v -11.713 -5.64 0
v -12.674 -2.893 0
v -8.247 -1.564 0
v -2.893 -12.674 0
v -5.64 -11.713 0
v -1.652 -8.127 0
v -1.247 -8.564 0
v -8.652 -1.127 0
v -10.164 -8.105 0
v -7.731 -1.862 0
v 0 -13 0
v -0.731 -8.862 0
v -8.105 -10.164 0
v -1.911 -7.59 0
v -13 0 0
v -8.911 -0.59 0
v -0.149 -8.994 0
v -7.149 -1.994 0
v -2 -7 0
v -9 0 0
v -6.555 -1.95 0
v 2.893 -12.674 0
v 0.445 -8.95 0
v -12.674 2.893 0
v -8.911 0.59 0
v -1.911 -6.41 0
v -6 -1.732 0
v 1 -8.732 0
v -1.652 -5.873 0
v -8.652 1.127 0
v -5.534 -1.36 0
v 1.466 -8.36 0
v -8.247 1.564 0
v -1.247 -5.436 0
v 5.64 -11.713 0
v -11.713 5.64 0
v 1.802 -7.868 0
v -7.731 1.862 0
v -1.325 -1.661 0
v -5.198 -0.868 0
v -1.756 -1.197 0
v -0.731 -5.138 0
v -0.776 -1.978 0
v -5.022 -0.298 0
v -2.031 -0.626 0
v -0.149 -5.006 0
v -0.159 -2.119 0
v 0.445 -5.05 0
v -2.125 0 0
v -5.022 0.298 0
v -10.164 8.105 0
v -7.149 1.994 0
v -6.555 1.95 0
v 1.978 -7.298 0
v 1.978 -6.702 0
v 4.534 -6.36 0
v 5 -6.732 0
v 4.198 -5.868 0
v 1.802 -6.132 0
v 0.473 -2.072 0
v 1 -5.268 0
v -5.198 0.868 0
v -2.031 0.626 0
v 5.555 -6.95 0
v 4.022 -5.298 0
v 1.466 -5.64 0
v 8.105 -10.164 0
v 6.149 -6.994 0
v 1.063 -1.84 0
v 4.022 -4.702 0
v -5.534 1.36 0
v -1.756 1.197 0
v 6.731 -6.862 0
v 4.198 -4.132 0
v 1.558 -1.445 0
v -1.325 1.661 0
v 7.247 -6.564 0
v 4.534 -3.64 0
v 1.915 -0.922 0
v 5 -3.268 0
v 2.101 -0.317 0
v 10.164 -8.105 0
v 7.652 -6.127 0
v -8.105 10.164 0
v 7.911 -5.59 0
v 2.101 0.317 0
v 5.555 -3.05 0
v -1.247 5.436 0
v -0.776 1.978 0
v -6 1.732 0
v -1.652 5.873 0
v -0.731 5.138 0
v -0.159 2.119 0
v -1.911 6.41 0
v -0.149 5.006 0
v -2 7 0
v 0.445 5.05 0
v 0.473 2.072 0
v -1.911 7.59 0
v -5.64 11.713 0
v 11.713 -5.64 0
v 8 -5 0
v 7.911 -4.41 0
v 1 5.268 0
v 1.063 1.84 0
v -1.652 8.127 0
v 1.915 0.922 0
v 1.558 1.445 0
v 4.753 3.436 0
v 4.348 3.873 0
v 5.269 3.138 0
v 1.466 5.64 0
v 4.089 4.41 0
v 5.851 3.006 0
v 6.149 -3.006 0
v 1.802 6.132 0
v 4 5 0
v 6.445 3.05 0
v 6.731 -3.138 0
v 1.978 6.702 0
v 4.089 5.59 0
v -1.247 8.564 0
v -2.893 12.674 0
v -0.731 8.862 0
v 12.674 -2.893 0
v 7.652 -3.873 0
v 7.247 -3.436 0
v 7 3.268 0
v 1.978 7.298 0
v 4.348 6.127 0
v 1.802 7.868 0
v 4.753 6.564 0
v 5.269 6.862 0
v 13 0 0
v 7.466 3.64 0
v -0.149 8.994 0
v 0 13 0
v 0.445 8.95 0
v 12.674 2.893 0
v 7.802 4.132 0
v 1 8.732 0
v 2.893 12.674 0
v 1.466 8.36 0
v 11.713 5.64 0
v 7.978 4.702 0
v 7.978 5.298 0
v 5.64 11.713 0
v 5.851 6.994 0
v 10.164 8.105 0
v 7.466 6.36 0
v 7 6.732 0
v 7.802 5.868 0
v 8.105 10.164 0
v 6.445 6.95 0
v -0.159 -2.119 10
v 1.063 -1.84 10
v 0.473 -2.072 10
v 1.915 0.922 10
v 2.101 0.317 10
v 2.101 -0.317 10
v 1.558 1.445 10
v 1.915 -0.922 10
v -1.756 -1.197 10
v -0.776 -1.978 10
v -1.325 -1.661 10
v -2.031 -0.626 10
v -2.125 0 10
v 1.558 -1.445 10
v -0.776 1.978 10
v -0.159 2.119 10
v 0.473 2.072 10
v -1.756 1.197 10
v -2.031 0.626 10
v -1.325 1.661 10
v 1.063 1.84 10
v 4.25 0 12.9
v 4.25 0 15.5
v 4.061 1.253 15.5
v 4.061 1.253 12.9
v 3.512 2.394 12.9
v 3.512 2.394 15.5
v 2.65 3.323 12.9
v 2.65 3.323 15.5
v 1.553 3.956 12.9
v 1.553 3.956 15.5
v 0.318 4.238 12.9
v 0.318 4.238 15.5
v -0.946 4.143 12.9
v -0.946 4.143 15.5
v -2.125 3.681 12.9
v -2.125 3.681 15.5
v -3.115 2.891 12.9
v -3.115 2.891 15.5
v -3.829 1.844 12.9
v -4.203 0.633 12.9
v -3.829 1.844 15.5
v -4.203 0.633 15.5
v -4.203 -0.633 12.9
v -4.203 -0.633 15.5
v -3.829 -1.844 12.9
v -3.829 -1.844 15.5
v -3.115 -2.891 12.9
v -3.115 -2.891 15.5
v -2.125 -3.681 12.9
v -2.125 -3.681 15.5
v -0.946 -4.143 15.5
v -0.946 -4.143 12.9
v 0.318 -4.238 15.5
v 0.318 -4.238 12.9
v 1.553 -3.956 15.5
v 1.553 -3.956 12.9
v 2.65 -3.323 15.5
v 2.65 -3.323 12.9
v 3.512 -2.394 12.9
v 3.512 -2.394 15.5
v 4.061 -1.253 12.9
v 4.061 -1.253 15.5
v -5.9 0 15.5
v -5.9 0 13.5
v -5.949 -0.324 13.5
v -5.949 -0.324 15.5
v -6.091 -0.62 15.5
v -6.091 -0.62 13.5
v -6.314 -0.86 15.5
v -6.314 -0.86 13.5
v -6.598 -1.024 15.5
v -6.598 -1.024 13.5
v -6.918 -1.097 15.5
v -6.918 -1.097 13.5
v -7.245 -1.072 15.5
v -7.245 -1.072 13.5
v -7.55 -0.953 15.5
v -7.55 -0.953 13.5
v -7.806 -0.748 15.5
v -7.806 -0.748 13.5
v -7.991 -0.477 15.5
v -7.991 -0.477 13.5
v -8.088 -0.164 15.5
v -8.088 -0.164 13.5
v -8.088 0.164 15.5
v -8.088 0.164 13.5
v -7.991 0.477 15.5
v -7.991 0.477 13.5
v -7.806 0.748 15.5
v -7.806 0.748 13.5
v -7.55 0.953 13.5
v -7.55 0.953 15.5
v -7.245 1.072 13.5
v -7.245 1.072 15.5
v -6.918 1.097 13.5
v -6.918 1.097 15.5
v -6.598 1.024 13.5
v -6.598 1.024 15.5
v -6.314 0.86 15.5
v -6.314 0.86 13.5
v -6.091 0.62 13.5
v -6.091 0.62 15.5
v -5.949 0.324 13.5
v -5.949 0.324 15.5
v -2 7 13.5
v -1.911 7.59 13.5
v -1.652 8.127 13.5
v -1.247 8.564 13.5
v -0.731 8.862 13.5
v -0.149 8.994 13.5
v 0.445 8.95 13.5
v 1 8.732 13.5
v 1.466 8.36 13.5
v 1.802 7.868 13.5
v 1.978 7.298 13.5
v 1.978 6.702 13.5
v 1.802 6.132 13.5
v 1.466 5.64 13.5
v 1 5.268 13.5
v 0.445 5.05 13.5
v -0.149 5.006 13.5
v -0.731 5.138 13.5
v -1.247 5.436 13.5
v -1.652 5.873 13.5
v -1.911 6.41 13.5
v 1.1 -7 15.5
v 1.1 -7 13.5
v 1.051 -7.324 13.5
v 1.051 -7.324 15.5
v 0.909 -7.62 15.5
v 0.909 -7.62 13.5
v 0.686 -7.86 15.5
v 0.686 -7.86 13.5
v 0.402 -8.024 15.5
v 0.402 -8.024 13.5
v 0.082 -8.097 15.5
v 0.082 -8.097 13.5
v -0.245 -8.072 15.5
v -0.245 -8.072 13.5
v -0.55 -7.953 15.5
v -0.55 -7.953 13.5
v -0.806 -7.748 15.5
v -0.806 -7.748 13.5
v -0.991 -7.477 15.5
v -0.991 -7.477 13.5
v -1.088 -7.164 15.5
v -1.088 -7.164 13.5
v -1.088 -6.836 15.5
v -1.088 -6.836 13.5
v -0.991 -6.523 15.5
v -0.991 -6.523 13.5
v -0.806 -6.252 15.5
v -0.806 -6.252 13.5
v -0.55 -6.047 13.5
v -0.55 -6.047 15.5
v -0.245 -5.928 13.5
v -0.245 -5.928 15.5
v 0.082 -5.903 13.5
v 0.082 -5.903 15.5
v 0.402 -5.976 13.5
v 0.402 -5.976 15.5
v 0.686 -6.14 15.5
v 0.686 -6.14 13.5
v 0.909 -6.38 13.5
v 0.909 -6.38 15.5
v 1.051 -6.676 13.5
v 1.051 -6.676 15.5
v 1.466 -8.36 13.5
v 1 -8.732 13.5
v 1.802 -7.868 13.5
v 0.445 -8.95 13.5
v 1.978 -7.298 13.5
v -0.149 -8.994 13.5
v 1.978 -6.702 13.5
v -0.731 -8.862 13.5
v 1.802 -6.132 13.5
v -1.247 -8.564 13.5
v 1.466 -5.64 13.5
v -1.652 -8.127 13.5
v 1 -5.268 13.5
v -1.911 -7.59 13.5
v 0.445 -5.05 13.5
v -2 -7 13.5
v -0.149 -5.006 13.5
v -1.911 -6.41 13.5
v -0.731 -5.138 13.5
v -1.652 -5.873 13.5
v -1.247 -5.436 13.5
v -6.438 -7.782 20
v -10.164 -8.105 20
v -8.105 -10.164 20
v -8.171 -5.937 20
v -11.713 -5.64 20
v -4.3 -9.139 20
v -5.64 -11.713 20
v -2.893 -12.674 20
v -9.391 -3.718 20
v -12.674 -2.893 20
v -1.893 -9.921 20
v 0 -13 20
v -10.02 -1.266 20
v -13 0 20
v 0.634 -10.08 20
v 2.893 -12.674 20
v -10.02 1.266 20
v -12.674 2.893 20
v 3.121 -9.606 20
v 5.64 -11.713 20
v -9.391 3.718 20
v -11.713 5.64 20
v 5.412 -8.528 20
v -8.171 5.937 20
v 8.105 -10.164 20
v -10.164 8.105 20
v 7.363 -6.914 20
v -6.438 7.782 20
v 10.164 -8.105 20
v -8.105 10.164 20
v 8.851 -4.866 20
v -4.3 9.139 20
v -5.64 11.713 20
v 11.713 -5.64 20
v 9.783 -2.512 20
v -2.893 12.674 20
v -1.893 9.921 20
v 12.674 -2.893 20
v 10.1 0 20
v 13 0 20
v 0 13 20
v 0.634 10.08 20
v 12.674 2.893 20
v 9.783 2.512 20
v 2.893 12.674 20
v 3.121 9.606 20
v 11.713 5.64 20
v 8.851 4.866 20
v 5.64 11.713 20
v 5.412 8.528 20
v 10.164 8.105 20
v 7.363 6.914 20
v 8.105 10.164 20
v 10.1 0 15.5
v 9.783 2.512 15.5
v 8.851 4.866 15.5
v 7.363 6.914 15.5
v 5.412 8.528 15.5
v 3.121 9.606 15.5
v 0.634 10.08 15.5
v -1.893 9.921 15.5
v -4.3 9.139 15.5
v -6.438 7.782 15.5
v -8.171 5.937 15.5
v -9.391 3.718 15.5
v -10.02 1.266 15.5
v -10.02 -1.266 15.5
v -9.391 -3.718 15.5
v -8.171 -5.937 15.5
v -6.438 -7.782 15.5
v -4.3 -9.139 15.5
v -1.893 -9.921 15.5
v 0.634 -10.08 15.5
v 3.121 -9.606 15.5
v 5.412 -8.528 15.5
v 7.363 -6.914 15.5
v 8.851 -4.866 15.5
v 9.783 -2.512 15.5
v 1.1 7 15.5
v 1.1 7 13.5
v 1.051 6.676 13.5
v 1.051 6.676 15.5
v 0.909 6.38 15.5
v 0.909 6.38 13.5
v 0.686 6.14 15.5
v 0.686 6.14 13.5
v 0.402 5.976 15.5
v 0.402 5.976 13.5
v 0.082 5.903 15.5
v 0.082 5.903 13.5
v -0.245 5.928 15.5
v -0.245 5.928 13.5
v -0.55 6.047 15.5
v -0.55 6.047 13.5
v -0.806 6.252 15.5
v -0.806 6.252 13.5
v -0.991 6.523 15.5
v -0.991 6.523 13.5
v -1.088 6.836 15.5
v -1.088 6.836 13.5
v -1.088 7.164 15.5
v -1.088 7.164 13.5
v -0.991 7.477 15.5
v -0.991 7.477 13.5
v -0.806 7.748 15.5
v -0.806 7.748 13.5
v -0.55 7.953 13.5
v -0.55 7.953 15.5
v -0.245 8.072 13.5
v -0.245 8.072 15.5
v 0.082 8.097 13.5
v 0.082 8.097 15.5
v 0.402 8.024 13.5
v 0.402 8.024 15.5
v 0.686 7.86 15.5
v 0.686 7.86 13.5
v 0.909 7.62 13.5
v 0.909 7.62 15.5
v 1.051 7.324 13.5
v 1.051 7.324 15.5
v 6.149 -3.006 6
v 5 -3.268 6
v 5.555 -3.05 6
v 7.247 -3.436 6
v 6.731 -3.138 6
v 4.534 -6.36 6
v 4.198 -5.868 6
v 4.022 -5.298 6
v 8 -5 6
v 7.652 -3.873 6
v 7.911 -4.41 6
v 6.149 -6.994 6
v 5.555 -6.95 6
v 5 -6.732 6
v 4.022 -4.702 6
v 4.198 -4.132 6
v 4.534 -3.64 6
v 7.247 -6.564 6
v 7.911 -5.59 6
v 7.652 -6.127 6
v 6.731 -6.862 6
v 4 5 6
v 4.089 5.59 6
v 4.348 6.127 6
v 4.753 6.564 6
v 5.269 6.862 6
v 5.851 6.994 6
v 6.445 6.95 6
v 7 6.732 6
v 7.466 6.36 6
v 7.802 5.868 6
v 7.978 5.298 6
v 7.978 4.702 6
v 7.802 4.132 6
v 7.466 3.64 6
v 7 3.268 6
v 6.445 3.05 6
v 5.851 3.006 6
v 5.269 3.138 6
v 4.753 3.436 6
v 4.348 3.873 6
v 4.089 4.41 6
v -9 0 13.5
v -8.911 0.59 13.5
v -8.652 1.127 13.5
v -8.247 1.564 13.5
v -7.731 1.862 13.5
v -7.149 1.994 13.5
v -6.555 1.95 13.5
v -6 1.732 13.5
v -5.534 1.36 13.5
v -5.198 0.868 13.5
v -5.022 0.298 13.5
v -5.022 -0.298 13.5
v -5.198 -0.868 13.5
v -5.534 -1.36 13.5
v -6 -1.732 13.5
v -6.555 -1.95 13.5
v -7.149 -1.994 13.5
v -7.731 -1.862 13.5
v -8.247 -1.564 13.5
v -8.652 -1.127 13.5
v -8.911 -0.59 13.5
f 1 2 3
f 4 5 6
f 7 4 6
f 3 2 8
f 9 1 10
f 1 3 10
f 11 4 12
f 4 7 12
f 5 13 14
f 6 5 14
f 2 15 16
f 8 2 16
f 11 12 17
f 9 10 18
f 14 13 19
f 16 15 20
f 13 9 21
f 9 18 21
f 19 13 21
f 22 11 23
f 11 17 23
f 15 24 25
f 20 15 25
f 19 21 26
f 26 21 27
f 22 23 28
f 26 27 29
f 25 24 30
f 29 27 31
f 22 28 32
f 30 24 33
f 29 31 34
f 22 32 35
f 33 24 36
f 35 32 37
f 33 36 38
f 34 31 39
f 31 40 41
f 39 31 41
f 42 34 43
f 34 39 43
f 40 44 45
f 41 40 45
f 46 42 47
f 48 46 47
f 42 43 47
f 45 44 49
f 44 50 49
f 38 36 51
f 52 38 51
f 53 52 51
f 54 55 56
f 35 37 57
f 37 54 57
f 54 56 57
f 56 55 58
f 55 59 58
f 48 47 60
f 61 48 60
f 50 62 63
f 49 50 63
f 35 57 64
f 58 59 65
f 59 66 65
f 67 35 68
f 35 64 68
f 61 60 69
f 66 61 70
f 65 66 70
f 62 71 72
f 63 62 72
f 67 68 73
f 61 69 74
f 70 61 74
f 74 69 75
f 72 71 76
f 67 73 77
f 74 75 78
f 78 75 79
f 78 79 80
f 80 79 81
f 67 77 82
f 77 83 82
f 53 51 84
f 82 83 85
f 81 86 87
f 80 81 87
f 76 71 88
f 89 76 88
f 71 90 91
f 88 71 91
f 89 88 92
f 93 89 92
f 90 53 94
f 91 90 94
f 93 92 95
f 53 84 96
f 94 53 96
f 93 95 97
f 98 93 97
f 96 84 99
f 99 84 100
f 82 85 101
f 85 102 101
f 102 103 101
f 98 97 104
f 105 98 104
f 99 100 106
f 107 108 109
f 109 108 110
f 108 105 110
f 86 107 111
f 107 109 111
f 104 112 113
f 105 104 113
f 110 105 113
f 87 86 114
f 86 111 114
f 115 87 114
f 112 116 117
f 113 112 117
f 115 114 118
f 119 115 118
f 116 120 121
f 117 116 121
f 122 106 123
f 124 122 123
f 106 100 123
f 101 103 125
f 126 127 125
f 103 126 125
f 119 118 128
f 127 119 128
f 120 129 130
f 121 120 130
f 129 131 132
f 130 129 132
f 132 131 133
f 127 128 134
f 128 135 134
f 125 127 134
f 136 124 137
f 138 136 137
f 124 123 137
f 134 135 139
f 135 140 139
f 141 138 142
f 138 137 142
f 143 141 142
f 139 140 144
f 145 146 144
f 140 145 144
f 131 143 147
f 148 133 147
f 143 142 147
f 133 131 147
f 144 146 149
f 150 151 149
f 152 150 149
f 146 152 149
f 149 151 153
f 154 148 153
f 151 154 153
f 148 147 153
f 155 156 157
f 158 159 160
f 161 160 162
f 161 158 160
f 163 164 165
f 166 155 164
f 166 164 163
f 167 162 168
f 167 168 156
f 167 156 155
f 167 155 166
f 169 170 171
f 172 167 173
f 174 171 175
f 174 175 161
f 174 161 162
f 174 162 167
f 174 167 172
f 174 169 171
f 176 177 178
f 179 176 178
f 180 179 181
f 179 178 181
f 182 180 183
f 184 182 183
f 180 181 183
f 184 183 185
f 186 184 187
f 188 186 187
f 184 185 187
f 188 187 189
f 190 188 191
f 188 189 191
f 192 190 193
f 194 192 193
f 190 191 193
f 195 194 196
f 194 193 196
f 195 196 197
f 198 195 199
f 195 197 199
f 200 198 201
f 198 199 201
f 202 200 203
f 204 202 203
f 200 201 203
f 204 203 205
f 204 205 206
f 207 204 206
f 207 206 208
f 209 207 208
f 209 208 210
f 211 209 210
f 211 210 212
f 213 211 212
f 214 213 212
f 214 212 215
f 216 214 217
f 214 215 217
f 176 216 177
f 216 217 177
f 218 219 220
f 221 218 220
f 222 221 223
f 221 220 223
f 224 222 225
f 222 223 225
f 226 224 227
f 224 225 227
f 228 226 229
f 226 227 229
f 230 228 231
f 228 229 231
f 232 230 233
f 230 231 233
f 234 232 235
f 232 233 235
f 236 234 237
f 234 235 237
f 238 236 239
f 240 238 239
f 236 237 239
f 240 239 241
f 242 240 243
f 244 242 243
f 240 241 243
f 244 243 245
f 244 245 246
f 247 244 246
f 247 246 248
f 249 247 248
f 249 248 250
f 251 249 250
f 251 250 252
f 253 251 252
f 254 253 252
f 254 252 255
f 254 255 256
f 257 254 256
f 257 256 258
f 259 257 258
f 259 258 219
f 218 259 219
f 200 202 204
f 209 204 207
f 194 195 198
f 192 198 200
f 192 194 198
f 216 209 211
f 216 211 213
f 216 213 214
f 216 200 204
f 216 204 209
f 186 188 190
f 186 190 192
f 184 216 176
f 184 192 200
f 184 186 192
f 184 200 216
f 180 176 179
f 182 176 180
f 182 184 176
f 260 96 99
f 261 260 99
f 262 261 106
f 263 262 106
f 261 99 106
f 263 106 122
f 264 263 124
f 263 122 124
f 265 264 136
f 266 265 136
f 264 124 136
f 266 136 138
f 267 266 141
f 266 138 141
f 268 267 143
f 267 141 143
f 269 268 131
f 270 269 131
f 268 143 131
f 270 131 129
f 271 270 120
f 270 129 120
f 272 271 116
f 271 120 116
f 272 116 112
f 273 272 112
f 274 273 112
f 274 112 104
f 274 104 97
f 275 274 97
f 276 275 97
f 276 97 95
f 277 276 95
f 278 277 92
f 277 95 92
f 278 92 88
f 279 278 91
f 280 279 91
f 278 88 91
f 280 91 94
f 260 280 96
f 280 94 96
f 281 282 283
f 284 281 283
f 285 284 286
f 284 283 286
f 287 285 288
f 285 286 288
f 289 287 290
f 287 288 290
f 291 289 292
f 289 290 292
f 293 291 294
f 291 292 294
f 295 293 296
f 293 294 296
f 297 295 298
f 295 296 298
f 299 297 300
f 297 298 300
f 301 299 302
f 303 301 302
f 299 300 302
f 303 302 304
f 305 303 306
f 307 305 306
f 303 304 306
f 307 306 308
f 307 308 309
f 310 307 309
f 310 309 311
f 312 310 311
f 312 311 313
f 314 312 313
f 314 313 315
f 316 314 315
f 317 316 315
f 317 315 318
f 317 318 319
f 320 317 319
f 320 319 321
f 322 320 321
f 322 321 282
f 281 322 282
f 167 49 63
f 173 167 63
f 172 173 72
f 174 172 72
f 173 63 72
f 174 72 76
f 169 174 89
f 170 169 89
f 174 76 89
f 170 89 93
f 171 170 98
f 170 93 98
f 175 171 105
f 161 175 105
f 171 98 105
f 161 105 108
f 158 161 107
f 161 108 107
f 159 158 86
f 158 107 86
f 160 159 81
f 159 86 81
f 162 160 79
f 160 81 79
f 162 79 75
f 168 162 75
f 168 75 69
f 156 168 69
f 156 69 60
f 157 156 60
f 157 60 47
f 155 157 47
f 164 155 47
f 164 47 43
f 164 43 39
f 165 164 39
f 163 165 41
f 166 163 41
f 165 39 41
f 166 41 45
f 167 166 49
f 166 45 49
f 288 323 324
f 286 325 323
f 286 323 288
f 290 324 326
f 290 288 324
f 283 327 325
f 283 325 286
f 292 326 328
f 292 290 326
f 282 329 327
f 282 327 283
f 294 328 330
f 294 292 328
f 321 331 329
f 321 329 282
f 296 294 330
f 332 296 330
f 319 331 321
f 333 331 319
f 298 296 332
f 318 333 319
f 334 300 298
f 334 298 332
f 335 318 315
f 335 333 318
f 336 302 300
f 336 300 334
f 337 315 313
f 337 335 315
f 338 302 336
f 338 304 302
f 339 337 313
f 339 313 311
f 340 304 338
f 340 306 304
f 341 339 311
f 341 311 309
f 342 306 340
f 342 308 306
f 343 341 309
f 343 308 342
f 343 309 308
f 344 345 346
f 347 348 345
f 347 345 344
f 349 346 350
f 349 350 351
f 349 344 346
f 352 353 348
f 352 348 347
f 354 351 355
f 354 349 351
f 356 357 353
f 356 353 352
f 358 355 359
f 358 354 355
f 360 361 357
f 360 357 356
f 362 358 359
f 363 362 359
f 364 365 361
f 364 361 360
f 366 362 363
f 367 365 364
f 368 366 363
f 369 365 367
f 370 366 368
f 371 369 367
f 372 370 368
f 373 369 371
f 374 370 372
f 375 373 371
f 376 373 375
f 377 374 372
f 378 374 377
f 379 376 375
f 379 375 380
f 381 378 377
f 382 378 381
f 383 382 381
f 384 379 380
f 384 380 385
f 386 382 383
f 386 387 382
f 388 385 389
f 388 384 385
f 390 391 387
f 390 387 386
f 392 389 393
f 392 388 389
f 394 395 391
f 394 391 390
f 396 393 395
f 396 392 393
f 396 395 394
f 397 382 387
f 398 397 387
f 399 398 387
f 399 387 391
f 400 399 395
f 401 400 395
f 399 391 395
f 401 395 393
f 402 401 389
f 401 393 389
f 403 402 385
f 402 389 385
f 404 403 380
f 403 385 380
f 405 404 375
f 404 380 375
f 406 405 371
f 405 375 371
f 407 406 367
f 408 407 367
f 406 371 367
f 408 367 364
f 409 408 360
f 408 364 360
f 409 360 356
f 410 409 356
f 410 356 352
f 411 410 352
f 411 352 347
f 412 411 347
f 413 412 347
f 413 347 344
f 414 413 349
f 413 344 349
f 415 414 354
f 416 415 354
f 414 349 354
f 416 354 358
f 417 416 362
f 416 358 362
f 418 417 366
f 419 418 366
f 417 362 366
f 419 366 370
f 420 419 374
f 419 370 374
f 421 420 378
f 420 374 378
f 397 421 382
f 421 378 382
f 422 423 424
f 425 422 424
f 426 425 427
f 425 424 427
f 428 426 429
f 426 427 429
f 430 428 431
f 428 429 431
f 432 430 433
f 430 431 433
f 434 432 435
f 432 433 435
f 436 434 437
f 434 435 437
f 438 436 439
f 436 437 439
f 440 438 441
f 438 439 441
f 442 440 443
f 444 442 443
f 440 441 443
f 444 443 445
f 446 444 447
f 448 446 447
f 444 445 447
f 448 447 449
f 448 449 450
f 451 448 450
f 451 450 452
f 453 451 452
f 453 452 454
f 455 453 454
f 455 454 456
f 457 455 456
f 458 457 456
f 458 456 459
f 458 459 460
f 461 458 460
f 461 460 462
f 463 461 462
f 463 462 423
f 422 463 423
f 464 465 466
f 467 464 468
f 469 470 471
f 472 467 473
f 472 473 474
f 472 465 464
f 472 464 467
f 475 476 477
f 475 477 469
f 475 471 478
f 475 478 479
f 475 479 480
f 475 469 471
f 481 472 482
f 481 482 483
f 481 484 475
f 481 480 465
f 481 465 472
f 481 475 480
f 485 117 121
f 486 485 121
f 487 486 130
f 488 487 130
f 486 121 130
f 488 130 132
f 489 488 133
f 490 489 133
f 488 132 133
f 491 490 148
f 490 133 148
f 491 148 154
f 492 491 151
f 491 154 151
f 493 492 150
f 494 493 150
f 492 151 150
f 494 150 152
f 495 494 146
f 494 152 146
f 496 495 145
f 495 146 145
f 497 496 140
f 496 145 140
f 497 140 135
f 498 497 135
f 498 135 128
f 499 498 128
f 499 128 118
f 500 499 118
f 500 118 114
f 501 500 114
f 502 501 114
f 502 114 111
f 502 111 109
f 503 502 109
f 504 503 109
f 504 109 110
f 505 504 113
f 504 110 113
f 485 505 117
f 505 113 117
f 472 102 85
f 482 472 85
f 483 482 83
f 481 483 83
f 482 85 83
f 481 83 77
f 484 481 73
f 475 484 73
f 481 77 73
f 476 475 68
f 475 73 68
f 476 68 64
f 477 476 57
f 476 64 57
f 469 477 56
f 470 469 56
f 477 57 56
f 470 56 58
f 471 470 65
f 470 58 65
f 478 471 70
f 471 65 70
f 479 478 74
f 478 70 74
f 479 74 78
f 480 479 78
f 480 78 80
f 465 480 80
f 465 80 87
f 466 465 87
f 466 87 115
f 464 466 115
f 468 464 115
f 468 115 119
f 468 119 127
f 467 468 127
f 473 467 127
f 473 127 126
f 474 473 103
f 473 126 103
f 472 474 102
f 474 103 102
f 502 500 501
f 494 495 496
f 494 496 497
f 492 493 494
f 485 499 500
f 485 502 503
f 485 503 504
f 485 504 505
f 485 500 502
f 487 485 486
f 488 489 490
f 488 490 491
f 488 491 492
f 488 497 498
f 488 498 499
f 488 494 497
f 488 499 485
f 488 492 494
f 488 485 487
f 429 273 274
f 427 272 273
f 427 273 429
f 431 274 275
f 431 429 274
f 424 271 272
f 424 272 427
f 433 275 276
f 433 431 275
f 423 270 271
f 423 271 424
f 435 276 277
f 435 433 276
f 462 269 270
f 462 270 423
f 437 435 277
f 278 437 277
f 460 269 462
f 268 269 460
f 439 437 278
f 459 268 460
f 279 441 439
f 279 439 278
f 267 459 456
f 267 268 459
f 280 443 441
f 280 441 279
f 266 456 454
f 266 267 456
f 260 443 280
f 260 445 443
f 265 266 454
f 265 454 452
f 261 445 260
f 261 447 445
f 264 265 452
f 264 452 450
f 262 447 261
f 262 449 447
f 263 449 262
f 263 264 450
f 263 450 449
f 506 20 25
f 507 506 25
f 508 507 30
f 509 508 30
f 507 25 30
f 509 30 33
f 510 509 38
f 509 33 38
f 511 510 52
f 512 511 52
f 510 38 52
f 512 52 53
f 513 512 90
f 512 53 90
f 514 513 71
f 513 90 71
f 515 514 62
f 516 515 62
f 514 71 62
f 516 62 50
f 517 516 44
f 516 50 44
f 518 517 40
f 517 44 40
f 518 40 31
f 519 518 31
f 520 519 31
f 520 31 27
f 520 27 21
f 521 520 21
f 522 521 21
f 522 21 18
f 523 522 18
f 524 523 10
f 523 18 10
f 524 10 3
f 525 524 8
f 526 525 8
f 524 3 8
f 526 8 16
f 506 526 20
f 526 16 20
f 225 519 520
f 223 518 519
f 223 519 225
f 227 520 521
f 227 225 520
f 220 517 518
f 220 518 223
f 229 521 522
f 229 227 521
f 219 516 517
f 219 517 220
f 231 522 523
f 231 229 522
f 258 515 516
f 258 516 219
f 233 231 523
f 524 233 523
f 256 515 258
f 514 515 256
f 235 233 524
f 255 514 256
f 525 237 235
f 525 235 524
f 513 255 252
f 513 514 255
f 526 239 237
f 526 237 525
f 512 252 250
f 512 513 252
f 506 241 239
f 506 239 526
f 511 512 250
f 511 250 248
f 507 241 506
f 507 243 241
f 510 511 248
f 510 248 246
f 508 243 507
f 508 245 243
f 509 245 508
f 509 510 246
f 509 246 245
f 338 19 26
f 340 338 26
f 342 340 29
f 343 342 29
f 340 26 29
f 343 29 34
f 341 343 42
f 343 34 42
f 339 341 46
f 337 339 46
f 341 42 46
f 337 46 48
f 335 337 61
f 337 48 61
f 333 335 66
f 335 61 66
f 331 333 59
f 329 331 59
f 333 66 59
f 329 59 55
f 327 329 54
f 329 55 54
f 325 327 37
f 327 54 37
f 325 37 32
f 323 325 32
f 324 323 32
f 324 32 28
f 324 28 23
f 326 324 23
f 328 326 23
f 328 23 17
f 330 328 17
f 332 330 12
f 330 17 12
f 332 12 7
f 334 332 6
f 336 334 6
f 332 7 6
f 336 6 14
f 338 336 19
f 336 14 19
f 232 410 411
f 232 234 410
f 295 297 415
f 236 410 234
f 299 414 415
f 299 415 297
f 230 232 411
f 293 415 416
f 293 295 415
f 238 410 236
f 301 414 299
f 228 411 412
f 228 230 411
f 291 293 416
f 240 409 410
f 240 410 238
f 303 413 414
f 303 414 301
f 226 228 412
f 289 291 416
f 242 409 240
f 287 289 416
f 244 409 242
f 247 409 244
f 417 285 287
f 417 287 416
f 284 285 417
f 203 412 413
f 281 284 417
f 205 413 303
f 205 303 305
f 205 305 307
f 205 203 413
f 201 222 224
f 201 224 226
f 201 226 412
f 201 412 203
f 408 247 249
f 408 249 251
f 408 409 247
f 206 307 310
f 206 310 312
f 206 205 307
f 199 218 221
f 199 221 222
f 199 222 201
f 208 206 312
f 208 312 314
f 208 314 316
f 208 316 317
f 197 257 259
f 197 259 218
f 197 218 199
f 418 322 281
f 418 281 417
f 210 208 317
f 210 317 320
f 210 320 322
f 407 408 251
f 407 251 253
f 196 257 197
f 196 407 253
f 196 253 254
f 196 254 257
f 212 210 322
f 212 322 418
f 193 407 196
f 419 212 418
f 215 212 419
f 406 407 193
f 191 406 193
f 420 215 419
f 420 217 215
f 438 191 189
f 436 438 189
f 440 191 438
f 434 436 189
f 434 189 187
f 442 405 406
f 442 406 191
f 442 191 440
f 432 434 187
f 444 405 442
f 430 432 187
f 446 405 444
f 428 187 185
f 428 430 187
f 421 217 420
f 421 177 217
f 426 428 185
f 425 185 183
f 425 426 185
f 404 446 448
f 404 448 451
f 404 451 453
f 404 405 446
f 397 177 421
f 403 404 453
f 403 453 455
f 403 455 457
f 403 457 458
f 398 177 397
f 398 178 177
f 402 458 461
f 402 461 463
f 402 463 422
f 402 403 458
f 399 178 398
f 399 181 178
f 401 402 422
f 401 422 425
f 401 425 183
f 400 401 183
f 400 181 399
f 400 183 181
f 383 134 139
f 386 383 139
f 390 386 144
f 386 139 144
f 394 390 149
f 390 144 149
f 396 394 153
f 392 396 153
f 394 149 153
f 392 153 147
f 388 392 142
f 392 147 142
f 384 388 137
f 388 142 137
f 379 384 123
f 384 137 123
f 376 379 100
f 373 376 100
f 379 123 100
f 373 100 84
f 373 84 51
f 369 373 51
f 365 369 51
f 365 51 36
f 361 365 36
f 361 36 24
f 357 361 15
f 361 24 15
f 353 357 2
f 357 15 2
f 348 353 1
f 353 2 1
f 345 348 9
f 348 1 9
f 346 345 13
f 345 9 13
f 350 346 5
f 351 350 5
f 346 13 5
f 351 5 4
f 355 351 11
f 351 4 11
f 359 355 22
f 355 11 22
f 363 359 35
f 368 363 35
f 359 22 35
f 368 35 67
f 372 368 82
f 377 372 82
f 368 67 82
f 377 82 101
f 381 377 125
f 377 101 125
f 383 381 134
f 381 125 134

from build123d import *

# Parameters (mm, degrees)
SKETCH1_R           = 13
BOSS_EXTRUDE1_DEPTH = 20
SKETCH2_R           = 10.1
CUT_EXTRUDE1_DEPTH  = 4.5
SKETCH3_R           = 4.25
CUT_EXTRUDE2_DEPTH  = 2.6
SKETCH4_R           = 2.125
CUT_EXTRUDE3_DEPTH  = 10
SKETCH5_R           = 2
CUT_EXTRUDE4_DEPTH  = 13.5
SKETCH6_R           = 1.1
CUT_EXTRUDE5_DEPTH  = 28.166155414
SKETCH7_R           = 2
CUT_EXTRUDE6_DEPTH  = 6


with BuildPart() as part:
    # Sketch1 → Boss-Extrude1 (new body)
    with BuildSketch(Plane.XY):
        Circle(SKETCH1_R)
    extrude(amount=BOSS_EXTRUDE1_DEPTH)

    # Sketch2 → Cut-Extrude1 (cut)
    with BuildSketch(Plane.XY.offset(20)):
        Circle(SKETCH2_R)
    extrude(amount=-CUT_EXTRUDE1_DEPTH, mode=Mode.SUBTRACT)

    # Sketch3 → Cut-Extrude2 (cut)
    with BuildSketch(Plane.XY.offset(15.5)):
        Circle(SKETCH3_R)
    extrude(amount=-CUT_EXTRUDE2_DEPTH, mode=Mode.SUBTRACT)

    # Sketch4 → Cut-Extrude3 (cut)
    with BuildSketch(Plane(origin=(0, 0, 0), x_dir=(-1, 0, 0), z_dir=(0, 0, -1))):
        Circle(SKETCH4_R)
    extrude(amount=-CUT_EXTRUDE3_DEPTH, mode=Mode.SUBTRACT)

    # Sketch5 → Cut-Extrude4 (cut)
    with BuildSketch(Plane(origin=(0, 0, 0), x_dir=(-1, 0, 0), z_dir=(0, 0, -1))):
        with Locations((0, 7)):
            Circle(SKETCH5_R)
        with Locations((7, 0)):
            Circle(SKETCH5_R)
        with Locations((0, -7)):
            Circle(SKETCH5_R)
    extrude(amount=-CUT_EXTRUDE4_DEPTH, mode=Mode.SUBTRACT)

    # Sketch6 → Cut-Extrude5 (cut, through all)
    with BuildSketch(Plane(origin=(0, 0, 0), x_dir=(-1, 0, 0), z_dir=(0, 0, -1))):
        with Locations(Location((0, 7, 0), (0, 0, 180))):
            Circle(SKETCH6_R)
        with Locations(Location((7, 0, 0), (0, 0, 180))):
            Circle(SKETCH6_R)
        with Locations(Location((0, -7, 0), (0, 0, 180))):
            Circle(SKETCH6_R)
    extrude(amount=-CUT_EXTRUDE5_DEPTH, mode=Mode.SUBTRACT)

    # Sketch7 → Cut-Extrude6 (cut)
    with BuildSketch(Plane(origin=(0, 0, 0), x_dir=(-1, 0, 0), z_dir=(0, 0, -1))):
        with Locations((-6, 5)):
            Circle(SKETCH7_R)
        with Locations(Location((-6, -5, 0), (0, 0, 180))):
            Circle(SKETCH7_R)
    extrude(amount=-CUT_EXTRUDE6_DEPTH, mode=Mode.SUBTRACT)


solid = part.part
